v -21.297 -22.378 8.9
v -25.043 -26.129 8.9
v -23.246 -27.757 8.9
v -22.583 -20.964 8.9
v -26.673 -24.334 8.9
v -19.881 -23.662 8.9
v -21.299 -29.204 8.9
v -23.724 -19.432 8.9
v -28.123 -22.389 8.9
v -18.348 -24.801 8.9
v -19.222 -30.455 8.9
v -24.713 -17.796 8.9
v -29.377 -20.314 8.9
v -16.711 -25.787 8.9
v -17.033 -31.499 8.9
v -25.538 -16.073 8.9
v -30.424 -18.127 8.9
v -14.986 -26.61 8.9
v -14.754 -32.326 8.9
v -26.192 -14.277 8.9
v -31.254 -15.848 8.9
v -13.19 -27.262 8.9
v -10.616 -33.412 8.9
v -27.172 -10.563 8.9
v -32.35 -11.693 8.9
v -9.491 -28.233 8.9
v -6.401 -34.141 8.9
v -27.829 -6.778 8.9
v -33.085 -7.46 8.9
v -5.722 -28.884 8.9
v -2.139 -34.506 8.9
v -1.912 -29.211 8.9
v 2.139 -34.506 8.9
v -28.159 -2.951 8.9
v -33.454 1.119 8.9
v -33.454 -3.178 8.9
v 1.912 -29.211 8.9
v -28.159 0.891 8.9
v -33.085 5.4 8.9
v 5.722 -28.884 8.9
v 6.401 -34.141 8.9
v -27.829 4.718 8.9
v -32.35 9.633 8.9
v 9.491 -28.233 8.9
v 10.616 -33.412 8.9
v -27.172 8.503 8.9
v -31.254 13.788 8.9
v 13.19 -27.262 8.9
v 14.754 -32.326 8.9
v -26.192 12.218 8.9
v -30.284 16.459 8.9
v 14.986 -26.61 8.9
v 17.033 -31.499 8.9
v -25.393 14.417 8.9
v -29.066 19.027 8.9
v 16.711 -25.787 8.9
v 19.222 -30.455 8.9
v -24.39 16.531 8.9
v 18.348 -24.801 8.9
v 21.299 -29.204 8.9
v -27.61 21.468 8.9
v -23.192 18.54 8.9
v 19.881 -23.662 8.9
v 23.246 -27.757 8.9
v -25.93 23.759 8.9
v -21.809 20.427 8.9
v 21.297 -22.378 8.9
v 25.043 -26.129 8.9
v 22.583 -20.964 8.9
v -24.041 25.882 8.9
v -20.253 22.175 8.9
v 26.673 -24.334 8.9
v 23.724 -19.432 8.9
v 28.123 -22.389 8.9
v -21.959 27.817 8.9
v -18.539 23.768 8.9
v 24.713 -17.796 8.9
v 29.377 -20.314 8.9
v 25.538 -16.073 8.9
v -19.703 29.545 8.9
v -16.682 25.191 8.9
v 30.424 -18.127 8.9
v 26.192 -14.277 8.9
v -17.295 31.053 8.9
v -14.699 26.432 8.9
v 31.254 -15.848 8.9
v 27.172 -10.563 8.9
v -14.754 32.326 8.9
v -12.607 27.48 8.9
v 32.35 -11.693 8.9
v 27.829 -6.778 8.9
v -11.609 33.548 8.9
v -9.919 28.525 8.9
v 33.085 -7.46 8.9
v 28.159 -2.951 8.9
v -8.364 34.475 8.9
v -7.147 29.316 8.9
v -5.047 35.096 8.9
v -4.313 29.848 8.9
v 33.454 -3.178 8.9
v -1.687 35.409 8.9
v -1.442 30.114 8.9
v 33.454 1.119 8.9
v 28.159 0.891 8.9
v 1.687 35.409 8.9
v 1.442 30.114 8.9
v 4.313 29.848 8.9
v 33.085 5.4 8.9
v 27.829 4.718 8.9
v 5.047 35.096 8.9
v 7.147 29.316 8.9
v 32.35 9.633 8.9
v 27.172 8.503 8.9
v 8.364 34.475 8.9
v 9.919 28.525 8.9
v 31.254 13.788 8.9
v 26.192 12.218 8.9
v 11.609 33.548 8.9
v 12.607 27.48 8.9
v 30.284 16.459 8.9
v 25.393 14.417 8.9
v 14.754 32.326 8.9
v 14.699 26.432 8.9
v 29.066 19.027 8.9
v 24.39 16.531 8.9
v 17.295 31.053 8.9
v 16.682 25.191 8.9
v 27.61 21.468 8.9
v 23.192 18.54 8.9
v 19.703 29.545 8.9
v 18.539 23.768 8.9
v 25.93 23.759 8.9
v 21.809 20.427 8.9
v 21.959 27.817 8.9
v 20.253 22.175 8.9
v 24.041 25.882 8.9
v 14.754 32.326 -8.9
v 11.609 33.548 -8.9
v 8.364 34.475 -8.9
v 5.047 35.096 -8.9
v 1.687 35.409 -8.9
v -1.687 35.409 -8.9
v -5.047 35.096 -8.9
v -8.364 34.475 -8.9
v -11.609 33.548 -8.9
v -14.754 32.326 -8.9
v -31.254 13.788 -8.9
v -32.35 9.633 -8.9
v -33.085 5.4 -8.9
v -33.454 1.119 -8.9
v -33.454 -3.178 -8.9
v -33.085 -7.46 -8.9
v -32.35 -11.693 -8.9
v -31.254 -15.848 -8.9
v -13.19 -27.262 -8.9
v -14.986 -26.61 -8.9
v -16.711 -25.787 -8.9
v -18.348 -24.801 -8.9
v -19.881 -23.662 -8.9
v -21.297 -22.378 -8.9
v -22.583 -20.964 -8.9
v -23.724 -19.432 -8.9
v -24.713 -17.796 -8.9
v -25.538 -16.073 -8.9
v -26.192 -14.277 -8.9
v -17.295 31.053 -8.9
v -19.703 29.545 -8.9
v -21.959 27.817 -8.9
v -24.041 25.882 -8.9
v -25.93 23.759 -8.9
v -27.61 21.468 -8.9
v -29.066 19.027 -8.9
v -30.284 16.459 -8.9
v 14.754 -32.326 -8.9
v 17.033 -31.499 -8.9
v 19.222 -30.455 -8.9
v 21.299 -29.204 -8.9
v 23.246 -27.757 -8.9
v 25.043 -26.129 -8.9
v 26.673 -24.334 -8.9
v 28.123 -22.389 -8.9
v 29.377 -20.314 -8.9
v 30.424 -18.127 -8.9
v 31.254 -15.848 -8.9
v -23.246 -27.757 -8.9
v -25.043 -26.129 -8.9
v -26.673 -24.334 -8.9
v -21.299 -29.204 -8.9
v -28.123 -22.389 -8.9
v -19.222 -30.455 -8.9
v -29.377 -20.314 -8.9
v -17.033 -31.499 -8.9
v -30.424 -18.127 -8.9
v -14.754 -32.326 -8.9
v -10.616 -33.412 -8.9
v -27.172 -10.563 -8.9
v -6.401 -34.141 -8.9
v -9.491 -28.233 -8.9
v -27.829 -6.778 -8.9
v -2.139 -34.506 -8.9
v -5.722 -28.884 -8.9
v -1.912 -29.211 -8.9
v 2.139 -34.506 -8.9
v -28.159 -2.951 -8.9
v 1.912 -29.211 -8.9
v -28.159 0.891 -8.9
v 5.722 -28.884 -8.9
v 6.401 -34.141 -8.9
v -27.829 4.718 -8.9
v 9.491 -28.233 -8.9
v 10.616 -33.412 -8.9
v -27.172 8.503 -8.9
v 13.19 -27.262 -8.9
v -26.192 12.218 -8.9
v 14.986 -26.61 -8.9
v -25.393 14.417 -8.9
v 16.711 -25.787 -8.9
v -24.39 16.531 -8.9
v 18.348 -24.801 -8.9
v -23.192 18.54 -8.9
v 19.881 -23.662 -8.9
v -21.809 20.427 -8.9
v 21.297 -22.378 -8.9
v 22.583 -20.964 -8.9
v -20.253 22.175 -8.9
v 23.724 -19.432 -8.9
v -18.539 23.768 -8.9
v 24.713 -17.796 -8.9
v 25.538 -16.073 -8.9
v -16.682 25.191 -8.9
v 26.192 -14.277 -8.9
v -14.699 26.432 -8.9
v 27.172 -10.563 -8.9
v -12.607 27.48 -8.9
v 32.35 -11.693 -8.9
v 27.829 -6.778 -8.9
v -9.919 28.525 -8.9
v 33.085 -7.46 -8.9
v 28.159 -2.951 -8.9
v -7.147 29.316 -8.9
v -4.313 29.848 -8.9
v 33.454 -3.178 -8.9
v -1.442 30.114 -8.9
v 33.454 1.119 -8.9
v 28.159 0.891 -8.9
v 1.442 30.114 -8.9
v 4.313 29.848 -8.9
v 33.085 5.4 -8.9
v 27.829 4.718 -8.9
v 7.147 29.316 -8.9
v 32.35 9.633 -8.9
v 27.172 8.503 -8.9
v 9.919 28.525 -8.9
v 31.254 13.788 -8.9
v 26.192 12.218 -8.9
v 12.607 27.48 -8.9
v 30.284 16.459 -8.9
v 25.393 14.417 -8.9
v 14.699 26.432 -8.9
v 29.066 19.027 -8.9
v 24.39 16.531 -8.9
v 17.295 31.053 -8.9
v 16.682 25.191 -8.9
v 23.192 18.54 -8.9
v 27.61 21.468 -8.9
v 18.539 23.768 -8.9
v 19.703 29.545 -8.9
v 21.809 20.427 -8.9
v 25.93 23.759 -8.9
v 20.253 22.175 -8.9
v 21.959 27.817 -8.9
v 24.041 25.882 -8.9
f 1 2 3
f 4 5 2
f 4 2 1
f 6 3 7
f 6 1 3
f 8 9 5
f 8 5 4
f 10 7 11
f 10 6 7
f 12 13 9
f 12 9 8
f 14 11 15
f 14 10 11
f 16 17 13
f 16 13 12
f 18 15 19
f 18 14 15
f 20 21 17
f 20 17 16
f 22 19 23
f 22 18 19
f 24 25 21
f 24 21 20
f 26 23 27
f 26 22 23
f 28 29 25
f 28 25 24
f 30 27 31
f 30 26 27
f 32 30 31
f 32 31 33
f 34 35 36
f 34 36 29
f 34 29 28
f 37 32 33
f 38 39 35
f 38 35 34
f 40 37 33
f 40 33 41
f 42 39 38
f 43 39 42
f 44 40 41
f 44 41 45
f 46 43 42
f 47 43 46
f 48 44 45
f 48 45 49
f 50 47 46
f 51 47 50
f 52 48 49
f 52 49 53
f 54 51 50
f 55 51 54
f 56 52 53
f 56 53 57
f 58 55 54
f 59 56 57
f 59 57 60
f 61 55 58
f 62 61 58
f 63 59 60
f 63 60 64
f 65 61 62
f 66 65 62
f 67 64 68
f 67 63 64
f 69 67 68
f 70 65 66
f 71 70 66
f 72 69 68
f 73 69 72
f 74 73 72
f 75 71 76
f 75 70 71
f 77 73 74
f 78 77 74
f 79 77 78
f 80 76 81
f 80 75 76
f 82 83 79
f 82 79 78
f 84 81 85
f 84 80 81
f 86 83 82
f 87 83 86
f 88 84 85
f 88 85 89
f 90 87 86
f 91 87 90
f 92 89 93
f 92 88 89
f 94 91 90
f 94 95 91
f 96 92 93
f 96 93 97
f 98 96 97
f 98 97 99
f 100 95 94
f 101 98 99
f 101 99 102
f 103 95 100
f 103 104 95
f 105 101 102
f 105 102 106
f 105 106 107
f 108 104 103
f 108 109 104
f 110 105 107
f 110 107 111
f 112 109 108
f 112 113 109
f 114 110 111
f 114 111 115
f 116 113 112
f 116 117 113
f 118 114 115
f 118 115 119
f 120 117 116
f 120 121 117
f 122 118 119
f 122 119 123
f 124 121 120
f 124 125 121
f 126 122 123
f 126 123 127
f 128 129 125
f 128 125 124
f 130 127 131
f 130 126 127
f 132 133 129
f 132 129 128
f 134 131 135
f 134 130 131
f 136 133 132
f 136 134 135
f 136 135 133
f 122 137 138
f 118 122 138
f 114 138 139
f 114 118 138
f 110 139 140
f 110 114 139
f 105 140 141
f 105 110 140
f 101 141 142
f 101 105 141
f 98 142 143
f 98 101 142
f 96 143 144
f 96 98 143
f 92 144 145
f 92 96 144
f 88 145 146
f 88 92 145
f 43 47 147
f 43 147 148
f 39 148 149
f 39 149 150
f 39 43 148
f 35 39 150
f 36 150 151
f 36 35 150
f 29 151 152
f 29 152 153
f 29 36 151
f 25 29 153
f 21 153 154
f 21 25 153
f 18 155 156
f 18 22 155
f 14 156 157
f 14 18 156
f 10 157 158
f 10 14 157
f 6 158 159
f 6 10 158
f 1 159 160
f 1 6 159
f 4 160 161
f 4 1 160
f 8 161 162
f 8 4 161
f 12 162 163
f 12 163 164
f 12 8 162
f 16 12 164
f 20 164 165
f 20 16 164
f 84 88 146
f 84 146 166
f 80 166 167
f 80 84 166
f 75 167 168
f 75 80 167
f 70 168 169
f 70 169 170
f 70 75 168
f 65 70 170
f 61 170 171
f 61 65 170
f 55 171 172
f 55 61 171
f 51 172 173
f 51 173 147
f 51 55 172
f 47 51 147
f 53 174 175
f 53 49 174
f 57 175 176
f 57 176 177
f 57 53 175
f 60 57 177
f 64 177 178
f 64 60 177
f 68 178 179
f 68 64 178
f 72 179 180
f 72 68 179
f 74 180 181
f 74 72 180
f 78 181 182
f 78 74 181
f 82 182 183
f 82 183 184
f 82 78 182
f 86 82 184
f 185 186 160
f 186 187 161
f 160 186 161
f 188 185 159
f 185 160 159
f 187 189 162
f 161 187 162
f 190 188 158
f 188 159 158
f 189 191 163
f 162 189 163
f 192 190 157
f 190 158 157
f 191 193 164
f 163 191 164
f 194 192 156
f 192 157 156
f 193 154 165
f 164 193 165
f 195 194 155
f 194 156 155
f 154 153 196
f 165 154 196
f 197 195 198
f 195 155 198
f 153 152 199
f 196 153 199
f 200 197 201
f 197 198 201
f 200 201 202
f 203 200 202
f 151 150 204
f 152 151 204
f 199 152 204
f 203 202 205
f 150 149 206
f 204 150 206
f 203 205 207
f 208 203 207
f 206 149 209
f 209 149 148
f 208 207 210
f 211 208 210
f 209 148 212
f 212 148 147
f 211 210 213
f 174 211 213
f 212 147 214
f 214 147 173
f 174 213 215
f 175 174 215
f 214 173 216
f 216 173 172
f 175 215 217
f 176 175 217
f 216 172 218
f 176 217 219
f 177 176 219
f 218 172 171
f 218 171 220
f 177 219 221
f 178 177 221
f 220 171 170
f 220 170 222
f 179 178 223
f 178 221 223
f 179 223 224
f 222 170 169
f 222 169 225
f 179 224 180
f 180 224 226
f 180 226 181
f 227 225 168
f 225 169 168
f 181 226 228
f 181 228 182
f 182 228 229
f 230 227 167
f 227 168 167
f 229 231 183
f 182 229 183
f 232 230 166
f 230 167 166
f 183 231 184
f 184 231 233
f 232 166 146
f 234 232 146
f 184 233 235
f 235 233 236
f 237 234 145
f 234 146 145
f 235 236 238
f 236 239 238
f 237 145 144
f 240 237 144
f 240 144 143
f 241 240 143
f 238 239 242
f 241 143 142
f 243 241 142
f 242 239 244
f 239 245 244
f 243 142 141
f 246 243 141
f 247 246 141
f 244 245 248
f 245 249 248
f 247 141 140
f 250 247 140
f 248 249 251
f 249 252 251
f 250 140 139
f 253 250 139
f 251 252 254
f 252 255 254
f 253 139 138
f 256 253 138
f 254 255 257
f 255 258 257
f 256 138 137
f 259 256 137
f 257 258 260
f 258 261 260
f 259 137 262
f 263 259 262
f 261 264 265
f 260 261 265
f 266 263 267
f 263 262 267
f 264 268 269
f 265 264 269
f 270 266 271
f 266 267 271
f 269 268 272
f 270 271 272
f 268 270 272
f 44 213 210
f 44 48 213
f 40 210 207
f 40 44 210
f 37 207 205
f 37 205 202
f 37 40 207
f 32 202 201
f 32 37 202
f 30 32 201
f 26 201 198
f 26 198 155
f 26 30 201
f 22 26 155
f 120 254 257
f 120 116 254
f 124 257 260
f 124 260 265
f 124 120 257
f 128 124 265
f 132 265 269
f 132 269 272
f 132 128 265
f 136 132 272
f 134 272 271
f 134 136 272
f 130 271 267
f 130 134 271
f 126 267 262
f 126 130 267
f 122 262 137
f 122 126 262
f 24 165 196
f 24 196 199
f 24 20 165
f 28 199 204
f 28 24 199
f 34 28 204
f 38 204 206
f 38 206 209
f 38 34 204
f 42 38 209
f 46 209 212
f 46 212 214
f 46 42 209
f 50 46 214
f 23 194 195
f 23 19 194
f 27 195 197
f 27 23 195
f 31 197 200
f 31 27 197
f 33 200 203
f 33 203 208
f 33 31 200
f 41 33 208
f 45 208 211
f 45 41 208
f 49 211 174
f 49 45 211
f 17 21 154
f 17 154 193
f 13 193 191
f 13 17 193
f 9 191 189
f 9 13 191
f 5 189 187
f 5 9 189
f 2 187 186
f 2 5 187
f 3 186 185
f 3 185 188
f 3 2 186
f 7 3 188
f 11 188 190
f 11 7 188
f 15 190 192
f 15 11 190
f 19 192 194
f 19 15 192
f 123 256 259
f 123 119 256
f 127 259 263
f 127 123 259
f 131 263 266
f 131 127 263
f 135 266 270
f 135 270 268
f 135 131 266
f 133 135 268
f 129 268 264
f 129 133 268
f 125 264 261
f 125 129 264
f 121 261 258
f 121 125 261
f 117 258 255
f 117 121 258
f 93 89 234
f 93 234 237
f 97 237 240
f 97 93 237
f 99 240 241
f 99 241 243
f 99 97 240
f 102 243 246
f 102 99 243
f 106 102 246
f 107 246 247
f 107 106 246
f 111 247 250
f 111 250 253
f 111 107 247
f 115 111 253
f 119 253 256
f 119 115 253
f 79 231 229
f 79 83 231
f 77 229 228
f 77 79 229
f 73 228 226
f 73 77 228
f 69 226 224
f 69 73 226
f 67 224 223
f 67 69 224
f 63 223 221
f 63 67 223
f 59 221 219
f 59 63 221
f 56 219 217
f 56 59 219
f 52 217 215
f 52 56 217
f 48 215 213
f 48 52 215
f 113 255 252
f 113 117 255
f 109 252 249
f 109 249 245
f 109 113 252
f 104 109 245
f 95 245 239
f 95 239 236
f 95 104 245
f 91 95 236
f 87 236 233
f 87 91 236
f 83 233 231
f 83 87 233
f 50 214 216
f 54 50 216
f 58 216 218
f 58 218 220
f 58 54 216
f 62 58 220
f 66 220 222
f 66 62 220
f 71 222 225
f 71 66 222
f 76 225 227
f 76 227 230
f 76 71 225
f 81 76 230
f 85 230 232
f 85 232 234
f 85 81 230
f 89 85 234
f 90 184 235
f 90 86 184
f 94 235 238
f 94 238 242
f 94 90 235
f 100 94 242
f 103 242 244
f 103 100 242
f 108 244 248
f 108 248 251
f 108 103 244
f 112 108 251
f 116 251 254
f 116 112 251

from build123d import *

# Parameters (mm, degrees)
F1_DEPTH = 8.9


with BuildPart() as f1:
    # F0 (on Top) → F1 (new body, symmetric)
    with BuildSketch(Plane.XY):
        with BuildLine():
            ThreePointArc((31.253762, 13.788255), (25.010493, 24.843211), (14.753762, 32.325853))
            ThreePointArc((14.753762, 32.325853), (0, 35.447848), (-14.753762, 32.325853))
            ThreePointArc((-14.753762, 32.325853), (-25.010493, 24.843211), (-31.253762, 13.788255))
            ThreePointArc((-31.253762, 13.788255), (-33.5, -1.029916), (-31.253762, -15.848088))
            ThreePointArc((-31.253762, -15.848088), (-25.042627, -26.128587), (-14.753762, -32.325853))
            ThreePointArc((-14.753762, -32.325853), (0, -34.552152), (14.753762, -32.325853))
            ThreePointArc((14.753762, -32.325853), (25.042627, -26.128587), (31.253762, -15.848088))
            ThreePointArc((31.253762, -15.848088), (33.5, -1.029916), (31.253762, 13.788255))
        make_face()
        with BuildLine():
            ThreePointArc((-12.606863, 27.480151), (0, 30.147848), (12.606863, 27.480151))
            ThreePointArc((12.606863, 27.480151), (21.051571, 21.319442), (26.191863, 12.217529))
            ThreePointArc((26.191863, 12.217529), (28.2, -1.029916), (26.191863, -14.277362))
            ThreePointArc((26.191863, -14.277362), (21.297489, -22.378395), (13.189863, -27.261841))
            ThreePointArc((13.189863, -27.261841), (0, -29.252152), (-13.189863, -27.261841))
            ThreePointArc((-13.189863, -27.261841), (-21.297489, -22.378395), (-26.191863, -14.277362))
            ThreePointArc((-26.191863, -14.277362), (-28.2, -1.029916), (-26.191863, 12.217529))
            ThreePointArc((-26.191863, 12.217529), (-21.051571, 21.319442), (-12.606863, 27.480151))
        make_face(mode=Mode.SUBTRACT)
    extrude(amount=F1_DEPTH, both=True)


solid = f1.part
